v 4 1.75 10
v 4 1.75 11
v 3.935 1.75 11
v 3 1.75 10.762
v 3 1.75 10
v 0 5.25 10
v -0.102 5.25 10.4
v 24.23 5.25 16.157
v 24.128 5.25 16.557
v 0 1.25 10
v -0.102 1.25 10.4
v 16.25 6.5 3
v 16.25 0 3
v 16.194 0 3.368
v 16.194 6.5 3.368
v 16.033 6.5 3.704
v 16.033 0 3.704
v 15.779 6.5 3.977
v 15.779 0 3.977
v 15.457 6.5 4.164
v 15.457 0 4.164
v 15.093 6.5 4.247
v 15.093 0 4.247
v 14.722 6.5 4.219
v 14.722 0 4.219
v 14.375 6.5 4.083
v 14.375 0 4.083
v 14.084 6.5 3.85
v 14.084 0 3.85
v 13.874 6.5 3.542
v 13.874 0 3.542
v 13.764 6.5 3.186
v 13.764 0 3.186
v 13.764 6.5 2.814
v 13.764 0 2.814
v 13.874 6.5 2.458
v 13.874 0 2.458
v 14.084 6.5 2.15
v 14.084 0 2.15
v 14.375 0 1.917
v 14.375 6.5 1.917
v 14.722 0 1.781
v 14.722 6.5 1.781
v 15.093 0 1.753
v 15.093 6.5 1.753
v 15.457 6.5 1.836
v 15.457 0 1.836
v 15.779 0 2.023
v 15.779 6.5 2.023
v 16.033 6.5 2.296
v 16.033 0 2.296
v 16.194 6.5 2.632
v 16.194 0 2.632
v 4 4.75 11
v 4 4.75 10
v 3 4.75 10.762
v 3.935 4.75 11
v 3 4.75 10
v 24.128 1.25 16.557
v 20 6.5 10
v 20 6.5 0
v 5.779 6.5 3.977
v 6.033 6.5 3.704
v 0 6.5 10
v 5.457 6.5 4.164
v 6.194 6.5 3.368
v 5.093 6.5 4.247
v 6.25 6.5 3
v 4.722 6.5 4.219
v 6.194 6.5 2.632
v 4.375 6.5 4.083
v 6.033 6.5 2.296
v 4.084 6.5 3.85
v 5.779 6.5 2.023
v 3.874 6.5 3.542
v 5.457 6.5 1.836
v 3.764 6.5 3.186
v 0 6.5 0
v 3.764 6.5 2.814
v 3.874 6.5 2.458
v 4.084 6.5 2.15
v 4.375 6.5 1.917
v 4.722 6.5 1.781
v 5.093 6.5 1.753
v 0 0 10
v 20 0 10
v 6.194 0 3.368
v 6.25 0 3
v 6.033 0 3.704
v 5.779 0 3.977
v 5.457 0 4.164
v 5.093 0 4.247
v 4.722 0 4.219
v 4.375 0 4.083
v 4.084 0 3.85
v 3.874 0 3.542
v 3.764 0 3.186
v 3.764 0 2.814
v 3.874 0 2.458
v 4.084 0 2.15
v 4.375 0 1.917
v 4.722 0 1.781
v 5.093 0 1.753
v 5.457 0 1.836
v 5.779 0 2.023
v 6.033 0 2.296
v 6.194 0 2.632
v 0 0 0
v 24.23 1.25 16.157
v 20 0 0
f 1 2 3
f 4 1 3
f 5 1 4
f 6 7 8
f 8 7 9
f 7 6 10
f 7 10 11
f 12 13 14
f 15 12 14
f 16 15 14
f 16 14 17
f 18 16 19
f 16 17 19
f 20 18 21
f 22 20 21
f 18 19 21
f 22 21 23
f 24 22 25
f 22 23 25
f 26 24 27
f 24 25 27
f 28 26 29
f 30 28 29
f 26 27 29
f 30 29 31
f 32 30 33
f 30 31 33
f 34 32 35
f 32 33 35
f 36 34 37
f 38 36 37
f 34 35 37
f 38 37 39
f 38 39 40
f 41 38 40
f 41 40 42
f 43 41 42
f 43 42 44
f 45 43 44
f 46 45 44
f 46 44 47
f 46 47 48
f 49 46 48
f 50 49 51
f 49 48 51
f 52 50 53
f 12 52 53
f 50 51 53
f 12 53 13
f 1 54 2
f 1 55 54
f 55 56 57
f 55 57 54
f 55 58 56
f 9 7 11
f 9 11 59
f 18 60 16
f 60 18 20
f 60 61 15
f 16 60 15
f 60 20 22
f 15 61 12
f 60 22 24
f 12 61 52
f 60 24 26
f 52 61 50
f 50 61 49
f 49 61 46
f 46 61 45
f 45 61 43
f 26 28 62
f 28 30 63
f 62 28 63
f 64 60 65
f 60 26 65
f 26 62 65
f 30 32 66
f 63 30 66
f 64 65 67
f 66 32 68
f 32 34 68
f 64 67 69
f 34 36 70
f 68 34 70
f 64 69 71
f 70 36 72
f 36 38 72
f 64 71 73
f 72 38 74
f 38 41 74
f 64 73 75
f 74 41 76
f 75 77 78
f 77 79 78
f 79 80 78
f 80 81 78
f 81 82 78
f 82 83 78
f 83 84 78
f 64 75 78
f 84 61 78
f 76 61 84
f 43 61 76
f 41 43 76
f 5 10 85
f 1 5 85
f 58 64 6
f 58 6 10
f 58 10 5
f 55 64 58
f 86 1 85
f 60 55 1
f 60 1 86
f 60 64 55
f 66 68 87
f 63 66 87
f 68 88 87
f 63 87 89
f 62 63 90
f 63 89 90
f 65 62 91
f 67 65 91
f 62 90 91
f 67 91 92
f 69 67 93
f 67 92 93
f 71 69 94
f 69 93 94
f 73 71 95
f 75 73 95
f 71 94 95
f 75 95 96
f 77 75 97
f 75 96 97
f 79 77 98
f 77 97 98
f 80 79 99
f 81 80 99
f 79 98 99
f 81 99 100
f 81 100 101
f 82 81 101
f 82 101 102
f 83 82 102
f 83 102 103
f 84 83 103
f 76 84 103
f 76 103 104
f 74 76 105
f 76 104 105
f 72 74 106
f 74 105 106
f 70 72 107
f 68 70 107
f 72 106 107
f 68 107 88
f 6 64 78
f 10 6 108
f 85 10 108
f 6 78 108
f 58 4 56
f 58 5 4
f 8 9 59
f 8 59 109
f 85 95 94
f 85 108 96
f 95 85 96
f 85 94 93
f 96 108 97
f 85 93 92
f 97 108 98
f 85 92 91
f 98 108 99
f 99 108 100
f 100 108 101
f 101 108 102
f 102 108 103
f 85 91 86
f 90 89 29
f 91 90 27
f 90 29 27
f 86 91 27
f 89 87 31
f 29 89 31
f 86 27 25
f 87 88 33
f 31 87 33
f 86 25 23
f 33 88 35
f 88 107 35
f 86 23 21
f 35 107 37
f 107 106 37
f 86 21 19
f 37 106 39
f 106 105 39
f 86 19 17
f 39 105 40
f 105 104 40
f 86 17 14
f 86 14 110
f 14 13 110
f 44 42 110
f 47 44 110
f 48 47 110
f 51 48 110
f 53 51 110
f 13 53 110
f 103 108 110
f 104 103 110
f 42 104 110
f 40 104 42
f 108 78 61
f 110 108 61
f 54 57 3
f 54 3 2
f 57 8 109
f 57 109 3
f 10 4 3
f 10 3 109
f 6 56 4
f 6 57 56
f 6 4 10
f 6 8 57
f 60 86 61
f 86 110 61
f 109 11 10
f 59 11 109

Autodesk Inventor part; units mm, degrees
ref_plane "YZ Plane" through (0, 0, 0) normal (1, 0, 0) x (0, 1, 0)
ref_plane "XZ Plane" through (0, 0, 0) normal (0, 1, 0) x (-1, 0, 0)
sketch "Sketch1" plane through (0, 0, 0) normal (0, 0, 1) x (1, 0, 0)
  line L0 (0, 0) -> (20, 0)
  line L1 (20, 0) -> (20, 6.5)
  line L2 (20, 6.5) -> (0, 6.5)
  line L3 (0, 6.5) -> (0, 0)
  dimension "d0" = 20
  dimension "d1" = 6.5
extrude "Extrusion1" add sketch "Sketch1" along normal blind 10
sketch "Sketch2" plane through (0, 0, 10) normal (0, 0, 1) x (1, 0, 0)
  line L0 (3, 4.75) -> (4, 4.75)
  line L1 (4, 4.75) -> (4, 1.75)
  line L2 (4, 1.75) -> (3, 1.75)
  line L3 (3, 1.75) -> (3, 4.75)
  line L4 (0, 6.5) -> (0, 0) projected
  point P0 (3, 3.25)
  point P1 (0, 3.25)
  dimension "d4" = 1
  dimension "d5" = 3
  dimension "d6" = 3
extrude "Extrusion2" add sketch "Sketch2" along normal blind 1
sketch "Sketch3" plane through (0, 0, 0) normal (0, -1, 0) x (1, 0, 0)
  circle A0 centre (5, 3) radius 1.25
  circle A1 centre (15, 3) radius 1.25
  line L0 (5, 3) -> (15, 3) construction
  line L1 (0, 0) -> (20, 0) construction
  point P0 (10, 3)
  point P1 (10, 0)
  dimension "d9" = 2.5
  dimension "d10" = 2.5
  dimension "d11" = 3
  dimension "d12" = 10
extrude "Extrusion3" cut sketch "Sketch3" against normal through all
ref_plane "Work Plane1" through (0, 3.25, 0) normal (0, -1, 0) x (1, 0, 0)
sketch "Sketch4" plane through (0, 3.25, 0) normal (0, -1, 0) x (1, 0, 0)
  line L0 (0, 10) -> (-0.1016, 10.4)
  line L1 (-0.1016, 10.4) -> (24.1283, 16.5571)
  line L2 (24.1283, 16.5571) -> (24.2299, 16.1571)
  line L3 (24.2299, 16.1571) -> (0, 10)
  dimension "d15" = 0.4
  dimension "d19" = 25
extrude "Extrusion4" add sketch "Sketch4" along normal mid plane 4
properties part number "lever switch 20x10x6"
